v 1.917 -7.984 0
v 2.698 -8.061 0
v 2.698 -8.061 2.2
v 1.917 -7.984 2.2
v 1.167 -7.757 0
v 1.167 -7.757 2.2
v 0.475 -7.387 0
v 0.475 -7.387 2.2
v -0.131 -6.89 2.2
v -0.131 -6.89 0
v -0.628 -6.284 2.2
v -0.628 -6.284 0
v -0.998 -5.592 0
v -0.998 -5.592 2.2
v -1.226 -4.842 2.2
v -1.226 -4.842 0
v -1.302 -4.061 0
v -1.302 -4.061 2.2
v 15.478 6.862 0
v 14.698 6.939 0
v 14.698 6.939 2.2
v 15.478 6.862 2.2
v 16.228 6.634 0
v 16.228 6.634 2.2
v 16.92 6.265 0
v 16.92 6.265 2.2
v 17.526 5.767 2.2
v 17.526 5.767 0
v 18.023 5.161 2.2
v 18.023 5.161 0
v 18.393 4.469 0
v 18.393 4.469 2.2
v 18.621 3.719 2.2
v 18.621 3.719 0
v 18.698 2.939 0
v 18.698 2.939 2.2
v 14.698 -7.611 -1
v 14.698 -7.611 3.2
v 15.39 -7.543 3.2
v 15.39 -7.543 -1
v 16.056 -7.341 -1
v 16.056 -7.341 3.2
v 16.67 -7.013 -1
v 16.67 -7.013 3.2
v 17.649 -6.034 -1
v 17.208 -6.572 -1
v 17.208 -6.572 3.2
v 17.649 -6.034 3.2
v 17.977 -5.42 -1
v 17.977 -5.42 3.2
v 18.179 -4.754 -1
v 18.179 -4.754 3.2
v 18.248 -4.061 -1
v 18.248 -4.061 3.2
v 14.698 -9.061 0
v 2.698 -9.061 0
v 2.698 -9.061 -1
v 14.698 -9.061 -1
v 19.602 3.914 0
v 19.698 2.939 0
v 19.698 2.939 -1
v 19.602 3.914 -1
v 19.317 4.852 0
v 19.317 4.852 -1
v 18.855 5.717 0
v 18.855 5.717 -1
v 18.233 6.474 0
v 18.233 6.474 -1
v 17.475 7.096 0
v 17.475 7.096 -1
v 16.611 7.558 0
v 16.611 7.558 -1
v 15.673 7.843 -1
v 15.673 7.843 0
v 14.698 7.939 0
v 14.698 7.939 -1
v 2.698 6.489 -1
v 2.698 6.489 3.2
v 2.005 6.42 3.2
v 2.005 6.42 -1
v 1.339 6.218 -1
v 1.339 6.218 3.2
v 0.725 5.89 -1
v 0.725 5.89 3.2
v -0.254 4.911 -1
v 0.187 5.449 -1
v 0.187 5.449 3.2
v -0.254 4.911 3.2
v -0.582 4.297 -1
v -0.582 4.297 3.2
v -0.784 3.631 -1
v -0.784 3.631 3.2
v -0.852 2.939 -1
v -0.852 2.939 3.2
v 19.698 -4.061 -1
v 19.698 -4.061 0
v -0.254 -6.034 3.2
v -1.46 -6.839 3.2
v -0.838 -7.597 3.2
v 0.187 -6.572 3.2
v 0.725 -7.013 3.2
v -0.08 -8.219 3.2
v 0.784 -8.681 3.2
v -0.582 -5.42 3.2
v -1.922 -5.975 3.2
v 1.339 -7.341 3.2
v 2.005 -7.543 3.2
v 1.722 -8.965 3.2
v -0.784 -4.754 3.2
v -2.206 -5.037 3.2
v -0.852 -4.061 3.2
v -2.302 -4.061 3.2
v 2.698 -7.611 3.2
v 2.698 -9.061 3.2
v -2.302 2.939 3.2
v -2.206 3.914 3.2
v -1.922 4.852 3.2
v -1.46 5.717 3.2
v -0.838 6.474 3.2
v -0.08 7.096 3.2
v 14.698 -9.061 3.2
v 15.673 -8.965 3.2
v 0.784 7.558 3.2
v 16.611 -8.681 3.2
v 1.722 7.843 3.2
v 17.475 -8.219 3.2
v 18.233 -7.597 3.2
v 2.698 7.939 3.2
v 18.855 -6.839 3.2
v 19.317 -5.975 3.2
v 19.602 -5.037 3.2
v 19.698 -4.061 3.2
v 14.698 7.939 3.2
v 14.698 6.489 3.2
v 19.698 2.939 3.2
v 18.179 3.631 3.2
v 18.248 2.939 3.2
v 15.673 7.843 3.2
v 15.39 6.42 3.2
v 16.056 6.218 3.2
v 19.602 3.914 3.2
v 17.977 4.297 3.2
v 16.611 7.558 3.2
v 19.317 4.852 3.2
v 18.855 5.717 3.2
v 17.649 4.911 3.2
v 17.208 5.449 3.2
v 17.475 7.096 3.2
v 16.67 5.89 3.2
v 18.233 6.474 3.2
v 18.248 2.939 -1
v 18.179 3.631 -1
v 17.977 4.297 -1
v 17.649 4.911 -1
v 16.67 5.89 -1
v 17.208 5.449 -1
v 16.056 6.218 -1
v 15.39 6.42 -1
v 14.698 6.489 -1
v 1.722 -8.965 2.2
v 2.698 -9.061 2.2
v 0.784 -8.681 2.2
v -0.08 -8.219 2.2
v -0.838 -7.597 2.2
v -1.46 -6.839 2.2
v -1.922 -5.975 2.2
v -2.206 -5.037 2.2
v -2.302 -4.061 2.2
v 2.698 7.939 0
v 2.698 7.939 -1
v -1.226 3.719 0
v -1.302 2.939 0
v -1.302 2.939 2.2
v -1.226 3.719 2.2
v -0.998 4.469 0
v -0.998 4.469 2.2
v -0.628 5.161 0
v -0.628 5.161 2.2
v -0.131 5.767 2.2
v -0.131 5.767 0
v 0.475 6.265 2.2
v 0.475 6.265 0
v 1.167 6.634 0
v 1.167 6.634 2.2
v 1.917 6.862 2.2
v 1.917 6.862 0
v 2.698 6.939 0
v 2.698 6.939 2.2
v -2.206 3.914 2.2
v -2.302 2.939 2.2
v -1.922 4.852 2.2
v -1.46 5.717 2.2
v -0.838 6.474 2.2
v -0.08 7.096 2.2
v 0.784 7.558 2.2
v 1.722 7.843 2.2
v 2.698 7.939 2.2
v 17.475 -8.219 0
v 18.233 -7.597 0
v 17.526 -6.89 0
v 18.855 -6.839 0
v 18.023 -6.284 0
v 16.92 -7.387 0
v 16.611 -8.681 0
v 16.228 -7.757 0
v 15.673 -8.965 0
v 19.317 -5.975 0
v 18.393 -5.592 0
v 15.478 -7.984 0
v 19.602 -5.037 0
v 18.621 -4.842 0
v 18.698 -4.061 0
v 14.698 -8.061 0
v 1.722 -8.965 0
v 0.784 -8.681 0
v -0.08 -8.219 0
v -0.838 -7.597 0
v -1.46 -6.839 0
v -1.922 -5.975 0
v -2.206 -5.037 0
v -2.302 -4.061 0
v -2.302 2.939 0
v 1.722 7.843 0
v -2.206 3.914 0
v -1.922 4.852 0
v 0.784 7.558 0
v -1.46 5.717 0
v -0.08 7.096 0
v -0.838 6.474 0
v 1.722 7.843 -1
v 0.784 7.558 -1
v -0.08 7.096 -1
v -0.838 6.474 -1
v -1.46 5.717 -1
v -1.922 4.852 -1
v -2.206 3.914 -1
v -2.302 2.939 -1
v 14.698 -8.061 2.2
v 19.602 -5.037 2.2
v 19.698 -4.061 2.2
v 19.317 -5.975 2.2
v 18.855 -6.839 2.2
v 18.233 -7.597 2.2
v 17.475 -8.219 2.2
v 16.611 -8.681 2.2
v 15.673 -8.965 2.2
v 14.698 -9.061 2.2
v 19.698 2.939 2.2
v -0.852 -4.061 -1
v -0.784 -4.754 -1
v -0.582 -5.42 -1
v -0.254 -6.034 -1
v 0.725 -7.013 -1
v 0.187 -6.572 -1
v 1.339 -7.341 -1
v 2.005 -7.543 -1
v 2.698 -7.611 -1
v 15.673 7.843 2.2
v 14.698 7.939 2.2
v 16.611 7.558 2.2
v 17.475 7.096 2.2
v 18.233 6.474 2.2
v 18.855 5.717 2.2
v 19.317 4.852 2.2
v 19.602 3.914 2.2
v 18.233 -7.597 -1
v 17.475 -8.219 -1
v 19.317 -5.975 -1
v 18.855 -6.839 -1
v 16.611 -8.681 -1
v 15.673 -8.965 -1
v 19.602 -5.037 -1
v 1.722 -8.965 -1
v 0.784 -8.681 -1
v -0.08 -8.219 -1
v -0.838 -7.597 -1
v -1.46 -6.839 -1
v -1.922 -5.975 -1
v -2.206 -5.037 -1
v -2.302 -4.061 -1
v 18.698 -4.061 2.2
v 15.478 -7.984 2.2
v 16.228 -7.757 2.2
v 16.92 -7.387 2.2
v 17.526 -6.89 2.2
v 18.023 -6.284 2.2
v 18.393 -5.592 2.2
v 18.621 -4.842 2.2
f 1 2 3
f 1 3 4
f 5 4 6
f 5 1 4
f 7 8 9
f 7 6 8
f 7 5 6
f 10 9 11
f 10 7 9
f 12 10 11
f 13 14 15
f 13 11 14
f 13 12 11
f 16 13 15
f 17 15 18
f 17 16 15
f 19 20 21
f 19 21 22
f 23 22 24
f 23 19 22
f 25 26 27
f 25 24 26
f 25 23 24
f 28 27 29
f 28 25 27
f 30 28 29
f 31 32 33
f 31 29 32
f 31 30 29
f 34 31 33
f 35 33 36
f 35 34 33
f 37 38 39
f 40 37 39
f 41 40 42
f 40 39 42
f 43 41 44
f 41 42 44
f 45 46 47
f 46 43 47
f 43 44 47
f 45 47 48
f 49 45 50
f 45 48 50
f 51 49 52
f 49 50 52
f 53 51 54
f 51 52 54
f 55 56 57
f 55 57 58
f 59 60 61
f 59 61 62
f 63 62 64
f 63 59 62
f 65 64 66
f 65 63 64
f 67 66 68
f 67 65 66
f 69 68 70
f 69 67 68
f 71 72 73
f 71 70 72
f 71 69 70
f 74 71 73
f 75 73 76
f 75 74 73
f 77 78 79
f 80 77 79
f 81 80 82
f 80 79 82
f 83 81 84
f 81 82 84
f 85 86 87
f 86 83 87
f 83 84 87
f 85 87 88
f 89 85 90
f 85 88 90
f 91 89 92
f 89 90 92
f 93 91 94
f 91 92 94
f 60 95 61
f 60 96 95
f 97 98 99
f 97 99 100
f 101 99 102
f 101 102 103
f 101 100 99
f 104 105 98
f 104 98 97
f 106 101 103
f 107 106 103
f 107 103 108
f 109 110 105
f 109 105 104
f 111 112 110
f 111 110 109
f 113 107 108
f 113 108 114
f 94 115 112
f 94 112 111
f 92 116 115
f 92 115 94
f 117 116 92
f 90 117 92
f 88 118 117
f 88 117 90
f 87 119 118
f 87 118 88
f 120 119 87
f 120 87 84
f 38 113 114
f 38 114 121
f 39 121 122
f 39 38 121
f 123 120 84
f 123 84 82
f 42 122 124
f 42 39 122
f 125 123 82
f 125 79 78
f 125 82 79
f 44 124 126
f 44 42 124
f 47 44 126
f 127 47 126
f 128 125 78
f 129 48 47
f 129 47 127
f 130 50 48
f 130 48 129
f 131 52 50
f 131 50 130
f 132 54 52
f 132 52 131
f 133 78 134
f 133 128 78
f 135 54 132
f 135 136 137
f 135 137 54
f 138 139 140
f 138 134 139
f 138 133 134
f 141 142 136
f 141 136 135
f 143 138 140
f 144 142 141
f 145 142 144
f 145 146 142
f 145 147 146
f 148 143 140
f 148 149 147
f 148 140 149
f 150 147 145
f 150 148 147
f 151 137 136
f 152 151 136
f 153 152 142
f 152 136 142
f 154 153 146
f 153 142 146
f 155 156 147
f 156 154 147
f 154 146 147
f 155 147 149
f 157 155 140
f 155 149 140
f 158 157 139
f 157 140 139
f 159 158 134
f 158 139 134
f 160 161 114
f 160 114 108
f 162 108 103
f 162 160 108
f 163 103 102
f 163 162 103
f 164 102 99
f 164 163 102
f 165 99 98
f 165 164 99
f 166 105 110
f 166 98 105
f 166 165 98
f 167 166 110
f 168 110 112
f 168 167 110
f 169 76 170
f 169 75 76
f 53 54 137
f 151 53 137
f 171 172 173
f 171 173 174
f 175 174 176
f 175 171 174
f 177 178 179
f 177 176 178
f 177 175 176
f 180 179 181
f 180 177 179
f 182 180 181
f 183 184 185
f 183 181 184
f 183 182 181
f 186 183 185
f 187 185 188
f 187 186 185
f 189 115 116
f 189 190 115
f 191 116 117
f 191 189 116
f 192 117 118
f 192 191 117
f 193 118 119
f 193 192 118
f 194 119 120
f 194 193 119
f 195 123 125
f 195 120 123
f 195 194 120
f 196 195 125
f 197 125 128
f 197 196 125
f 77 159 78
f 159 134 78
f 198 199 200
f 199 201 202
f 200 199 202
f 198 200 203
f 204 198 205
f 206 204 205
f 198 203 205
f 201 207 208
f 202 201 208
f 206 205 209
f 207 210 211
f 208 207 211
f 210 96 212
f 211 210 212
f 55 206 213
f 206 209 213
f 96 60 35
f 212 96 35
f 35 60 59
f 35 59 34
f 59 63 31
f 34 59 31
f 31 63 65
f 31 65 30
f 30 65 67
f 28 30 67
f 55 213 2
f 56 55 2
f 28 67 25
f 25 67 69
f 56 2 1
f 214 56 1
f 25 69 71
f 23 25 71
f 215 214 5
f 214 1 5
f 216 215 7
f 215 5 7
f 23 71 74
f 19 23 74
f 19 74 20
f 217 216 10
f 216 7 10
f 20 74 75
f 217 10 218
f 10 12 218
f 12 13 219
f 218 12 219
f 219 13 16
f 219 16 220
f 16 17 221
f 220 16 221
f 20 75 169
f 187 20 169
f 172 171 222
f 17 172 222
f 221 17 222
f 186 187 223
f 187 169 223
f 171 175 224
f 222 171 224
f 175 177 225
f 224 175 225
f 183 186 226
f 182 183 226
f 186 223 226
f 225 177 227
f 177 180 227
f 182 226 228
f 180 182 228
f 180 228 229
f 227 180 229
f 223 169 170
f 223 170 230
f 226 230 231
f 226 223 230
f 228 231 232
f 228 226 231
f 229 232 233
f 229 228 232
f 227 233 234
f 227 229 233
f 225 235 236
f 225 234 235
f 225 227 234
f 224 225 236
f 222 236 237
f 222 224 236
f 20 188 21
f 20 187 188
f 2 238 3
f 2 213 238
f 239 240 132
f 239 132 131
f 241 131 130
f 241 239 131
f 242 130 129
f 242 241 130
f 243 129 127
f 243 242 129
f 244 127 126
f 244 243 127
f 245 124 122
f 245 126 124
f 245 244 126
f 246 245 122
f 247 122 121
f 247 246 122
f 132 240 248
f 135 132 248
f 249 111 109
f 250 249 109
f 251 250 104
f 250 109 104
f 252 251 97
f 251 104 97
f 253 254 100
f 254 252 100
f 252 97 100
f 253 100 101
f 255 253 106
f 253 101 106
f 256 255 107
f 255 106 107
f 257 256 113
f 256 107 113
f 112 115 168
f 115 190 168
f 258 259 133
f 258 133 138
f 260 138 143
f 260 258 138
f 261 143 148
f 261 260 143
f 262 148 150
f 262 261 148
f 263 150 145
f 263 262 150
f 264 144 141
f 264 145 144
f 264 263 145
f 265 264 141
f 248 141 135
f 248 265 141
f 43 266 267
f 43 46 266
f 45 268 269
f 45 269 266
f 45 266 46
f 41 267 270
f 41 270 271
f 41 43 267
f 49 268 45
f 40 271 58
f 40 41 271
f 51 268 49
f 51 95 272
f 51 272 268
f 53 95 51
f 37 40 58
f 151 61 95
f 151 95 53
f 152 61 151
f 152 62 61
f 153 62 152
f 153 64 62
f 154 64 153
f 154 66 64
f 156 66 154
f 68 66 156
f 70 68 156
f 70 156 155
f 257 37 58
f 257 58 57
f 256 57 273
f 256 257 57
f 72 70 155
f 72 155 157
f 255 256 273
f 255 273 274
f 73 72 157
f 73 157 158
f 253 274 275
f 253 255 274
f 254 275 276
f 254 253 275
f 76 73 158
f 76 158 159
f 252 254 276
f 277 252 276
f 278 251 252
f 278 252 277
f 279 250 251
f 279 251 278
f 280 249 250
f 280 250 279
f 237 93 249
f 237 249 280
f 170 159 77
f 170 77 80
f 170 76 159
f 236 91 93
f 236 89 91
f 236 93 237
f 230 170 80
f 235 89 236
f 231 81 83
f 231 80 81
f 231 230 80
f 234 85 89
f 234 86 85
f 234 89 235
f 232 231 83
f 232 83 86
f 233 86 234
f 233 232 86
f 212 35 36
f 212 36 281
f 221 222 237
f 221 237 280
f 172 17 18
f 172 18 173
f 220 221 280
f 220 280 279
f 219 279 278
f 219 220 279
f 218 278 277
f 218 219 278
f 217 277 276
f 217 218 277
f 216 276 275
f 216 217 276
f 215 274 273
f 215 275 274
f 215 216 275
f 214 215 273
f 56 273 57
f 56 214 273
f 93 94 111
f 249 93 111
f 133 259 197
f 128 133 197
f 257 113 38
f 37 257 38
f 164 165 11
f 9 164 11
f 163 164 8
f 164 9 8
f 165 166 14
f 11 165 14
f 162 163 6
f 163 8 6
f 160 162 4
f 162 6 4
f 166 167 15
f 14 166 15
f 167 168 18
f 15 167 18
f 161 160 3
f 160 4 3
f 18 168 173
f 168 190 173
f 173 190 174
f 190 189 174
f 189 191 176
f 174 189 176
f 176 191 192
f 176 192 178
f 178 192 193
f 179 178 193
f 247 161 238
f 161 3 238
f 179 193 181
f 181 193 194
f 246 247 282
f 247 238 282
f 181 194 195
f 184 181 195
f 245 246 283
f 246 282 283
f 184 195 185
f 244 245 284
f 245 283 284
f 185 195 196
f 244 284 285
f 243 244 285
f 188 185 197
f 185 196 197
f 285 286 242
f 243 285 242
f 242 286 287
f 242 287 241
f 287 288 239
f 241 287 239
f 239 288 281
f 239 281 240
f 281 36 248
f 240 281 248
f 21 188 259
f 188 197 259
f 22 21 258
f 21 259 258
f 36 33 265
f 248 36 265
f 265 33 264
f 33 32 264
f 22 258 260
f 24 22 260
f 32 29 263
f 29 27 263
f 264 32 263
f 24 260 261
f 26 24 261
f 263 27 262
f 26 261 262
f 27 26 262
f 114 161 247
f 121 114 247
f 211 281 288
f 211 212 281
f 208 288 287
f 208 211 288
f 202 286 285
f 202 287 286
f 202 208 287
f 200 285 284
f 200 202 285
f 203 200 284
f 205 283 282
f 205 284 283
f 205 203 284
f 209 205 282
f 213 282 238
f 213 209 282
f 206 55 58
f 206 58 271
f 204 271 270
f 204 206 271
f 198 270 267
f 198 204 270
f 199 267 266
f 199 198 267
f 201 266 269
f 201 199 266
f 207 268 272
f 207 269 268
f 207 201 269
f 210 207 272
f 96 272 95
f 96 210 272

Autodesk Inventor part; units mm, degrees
ref_plane "YZ Plane" through (0, 0, 0) normal (1, 0, 0) x (0, 1, 0)
ref_plane "XZ Plane" through (0, 0, 0) normal (0, 1, 0) x (-1, 0, 0)
ref_plane "XY Plane" through (0, 0, 0) normal (0, 0, 1) x (1, 0, 0)
sketch "Szkic1" plane through (0, 0, 0) normal (0, 0, 1) x (1, 0, 0)
  line L0 (2.6976, 6.9387) -> (14.6976, 6.9387)
  line L1 (18.6976, 2.9387) -> (18.6976, -4.0613)
  line L2 (14.6976, -8.0613) -> (2.6976, -8.0613)
  line L3 (-1.3024, -4.0613) -> (-1.3024, 2.9387)
  arc A0 (2.6976, 6.9387) -> (-1.3024, 2.9387) centre (2.6976, 2.9387) ccw
  arc A1 (18.6976, 2.9387) -> (14.6976, 6.9387) centre (14.6976, 2.9387) ccw
  arc A2 (14.6976, -8.0613) -> (18.6976, -4.0613) centre (14.6976, -4.0613) ccw
  arc A3 (-1.3024, -4.0613) -> (2.6976, -8.0613) centre (2.6976, -4.0613) ccw
  line L4 (14.6976, 6.4887) -> (2.6976, 6.4887)
  arc A4 (2.6976, 6.4887) -> (-0.8524, 2.9387) centre (2.6976, 2.9387) ccw
  line L5 (-0.8524, 2.9387) -> (-0.8524, -4.0613)
  arc A5 (-0.8524, -4.0613) -> (2.6976, -7.6113) centre (2.6976, -4.0613) ccw
  line L6 (2.6976, -7.6113) -> (14.6976, -7.6113)
  arc A6 (14.6976, -7.6113) -> (18.2476, -4.0613) centre (14.6976, -4.0613) ccw
  line L7 (18.2476, -4.0613) -> (18.2476, 2.9387)
  arc A7 (18.2476, 2.9387) -> (14.6976, 6.4887) centre (14.6976, 2.9387) ccw
  point P0 (0, 0)
  point P1 (18.6976, -8.0613)
  point P2 (18.6976, 6.9387)
  point P3 (-1.3024, -8.0613)
  dimension "d0" = 20
  dimension "d1" = 15
  dimension "d2" = 4
  dimension "d3" = 0.45
extrude "Wyciągnięcie proste1" add sketch "Szkic1" along normal blind 2.2
sketch "Szkic2" plane through (0, 0, 2.2) normal (0, 0, 1) x (1, 0, 0)
  arc A0 (18.2476, 2.9387) -> (14.6976, 6.4887) centre (14.6976, 2.9387) ccw projected
  line L0 (18.2476, 2.9387) -> (18.2476, -4.0613) projected
  arc A1 (14.6976, -7.6113) -> (18.2476, -4.0613) centre (14.6976, -4.0613) ccw projected
  line L1 (14.6976, -7.6113) -> (2.6976, -7.6113) projected
  arc A2 (-0.8524, -4.0613) -> (2.6976, -7.6113) centre (2.6976, -4.0613) ccw projected
  line L2 (-0.8524, -4.0613) -> (-0.8524, 2.9387) projected
  arc A3 (2.6976, 6.4887) -> (-0.8524, 2.9387) centre (2.6976, 2.9387) ccw projected
  line L3 (2.6976, 6.4887) -> (14.6976, 6.4887) projected
  line L4 (-1.3024, 2.9387) -> (-1.3024, -4.0613) projected
  arc A4 (-1.3024, -4.0613) -> (2.6976, -8.0613) centre (2.6976, -4.0613) ccw projected
  line L5 (2.6976, -8.0613) -> (14.6976, -8.0613) projected
  arc A5 (14.6976, -8.0613) -> (18.6976, -4.0613) centre (14.6976, -4.0613) ccw projected
  line L6 (18.6976, -4.0613) -> (18.6976, 2.9387) projected
  arc A6 (18.6976, 2.9387) -> (14.6976, 6.9387) centre (14.6976, 2.9387) ccw projected
  line L7 (14.6976, 6.9387) -> (2.6976, 6.9387) projected
  arc A7 (2.6976, 6.9387) -> (-1.3024, 2.9387) centre (2.6976, 2.9387) ccw projected
  line L8 (-2.3024, 2.9387) -> (-2.3024, -4.0613)
  arc A8 (-2.3024, -4.0613) -> (2.6976, -9.0613) centre (2.6976, -4.0613) ccw
  line L9 (2.6976, -9.0613) -> (14.6976, -9.0613)
  arc A9 (14.6976, -9.0613) -> (19.6976, -4.0613) centre (14.6976, -4.0613) ccw
  line L10 (19.6976, -4.0613) -> (19.6976, 2.9387)
  arc A10 (19.6976, 2.9387) -> (14.6976, 7.9387) centre (14.6976, 2.9387) ccw
  line L11 (14.6976, 7.9387) -> (2.6976, 7.9387)
  arc A11 (2.6976, 7.9387) -> (-2.3024, 2.9387) centre (2.6976, 2.9387) ccw
  point P0 (0, 0)
  dimension "d6" = 1
extrude "Wyciągnięcie proste2" add sketch "Szkic2" along normal blind 1 contours A7 L7 A6 L6 A5 L5 A4 L4 | A11 L11 A10 L10 A9 L9 A8 L8
sketch "Szkic3" plane through (0, 0, 0) normal (0, 0, -1) x (-1, 0, 0)
  line L0 (2.3024, 2.9387) -> (2.3024, -4.0613) projected
  arc A0 (2.3024, 2.9387) -> (-2.6976, 7.9387) centre (-2.6976, 2.9387) ccw projected
  line L1 (-14.6976, 7.9387) -> (-2.6976, 7.9387) projected
  arc A1 (-14.6976, 7.9387) -> (-19.6976, 2.9387) centre (-14.6976, 2.9387) ccw projected
  line L2 (-19.6976, -4.0613) -> (-19.6976, 2.9387) projected
  arc A2 (-19.6976, -4.0613) -> (-14.6976, -9.0613) centre (-14.6976, -4.0613) ccw projected
  line L3 (-2.6976, -9.0613) -> (-14.6976, -9.0613) projected
  arc A3 (-2.6976, -9.0613) -> (2.3024, -4.0613) centre (-2.6976, -4.0613) ccw projected
  arc A4 (1.3024, 2.9387) -> (-2.6976, 6.9387) centre (-2.6976, 2.9387) ccw projected
  line L4 (1.3024, 2.9387) -> (1.3024, -4.0613) projected
  arc A5 (-2.6976, -8.0613) -> (1.3024, -4.0613) centre (-2.6976, -4.0613) ccw projected
  line L5 (-2.6976, -8.0613) -> (-14.6976, -8.0613) projected
  arc A6 (-18.6976, -4.0613) -> (-14.6976, -8.0613) centre (-14.6976, -4.0613) ccw projected
  line L6 (-18.6976, -4.0613) -> (-18.6976, 2.9387) projected
  arc A7 (-14.6976, 6.9387) -> (-18.6976, 2.9387) centre (-14.6976, 2.9387) ccw projected
  line L7 (-14.6976, 6.9387) -> (-2.6976, 6.9387) projected
  arc A8 (-14.6976, 6.4887) -> (-18.2476, 2.9387) centre (-14.6976, 2.9387) ccw projected
  line L8 (-14.6976, 6.4887) -> (-2.6976, 6.4887) projected
  arc A9 (0.8524, 2.9387) -> (-2.6976, 6.4887) centre (-2.6976, 2.9387) ccw projected
  line L9 (0.8524, 2.9387) -> (0.8524, -4.0613) projected
  arc A10 (-2.6976, -7.6113) -> (0.8524, -4.0613) centre (-2.6976, -4.0613) ccw projected
  line L10 (-2.6976, -7.6113) -> (-14.6976, -7.6113) projected
  arc A11 (-18.2476, -4.0613) -> (-14.6976, -7.6113) centre (-14.6976, -4.0613) ccw projected
  line L11 (-18.2476, -4.0613) -> (-18.2476, 2.9387) projected
  line L12 (1.3024, 2.9387) -> (1.3024, -4.0613) projected
  arc A12 (1.3024, 2.9387) -> (-2.6976, 6.9387) centre (-2.6976, 2.9387) ccw projected
  line L13 (-14.6976, 6.9387) -> (-2.6976, 6.9387) projected
  arc A13 (-14.6976, 6.9387) -> (-18.6976, 2.9387) centre (-14.6976, 2.9387) ccw projected
  line L14 (-18.6976, -4.0613) -> (-18.6976, 2.9387) projected
  arc A14 (-18.6976, -4.0613) -> (-14.6976, -8.0613) centre (-14.6976, -4.0613) ccw projected
  line L15 (-2.6976, -8.0613) -> (-14.6976, -8.0613) projected
  arc A15 (-2.6976, -8.0613) -> (1.3024, -4.0613) centre (-2.6976, -4.0613) ccw projected
  point P0 (0, 0)
extrude "Wyciągnięcie proste3" add sketch "Szkic3" along normal blind 1 contours L0 A3 L3 A2 L2 A1 L1 A0 | L4 A5 L5 A6 L6 A7 L7 A4
properties part number "3DP_TPU_Cable_Feed_Through"
